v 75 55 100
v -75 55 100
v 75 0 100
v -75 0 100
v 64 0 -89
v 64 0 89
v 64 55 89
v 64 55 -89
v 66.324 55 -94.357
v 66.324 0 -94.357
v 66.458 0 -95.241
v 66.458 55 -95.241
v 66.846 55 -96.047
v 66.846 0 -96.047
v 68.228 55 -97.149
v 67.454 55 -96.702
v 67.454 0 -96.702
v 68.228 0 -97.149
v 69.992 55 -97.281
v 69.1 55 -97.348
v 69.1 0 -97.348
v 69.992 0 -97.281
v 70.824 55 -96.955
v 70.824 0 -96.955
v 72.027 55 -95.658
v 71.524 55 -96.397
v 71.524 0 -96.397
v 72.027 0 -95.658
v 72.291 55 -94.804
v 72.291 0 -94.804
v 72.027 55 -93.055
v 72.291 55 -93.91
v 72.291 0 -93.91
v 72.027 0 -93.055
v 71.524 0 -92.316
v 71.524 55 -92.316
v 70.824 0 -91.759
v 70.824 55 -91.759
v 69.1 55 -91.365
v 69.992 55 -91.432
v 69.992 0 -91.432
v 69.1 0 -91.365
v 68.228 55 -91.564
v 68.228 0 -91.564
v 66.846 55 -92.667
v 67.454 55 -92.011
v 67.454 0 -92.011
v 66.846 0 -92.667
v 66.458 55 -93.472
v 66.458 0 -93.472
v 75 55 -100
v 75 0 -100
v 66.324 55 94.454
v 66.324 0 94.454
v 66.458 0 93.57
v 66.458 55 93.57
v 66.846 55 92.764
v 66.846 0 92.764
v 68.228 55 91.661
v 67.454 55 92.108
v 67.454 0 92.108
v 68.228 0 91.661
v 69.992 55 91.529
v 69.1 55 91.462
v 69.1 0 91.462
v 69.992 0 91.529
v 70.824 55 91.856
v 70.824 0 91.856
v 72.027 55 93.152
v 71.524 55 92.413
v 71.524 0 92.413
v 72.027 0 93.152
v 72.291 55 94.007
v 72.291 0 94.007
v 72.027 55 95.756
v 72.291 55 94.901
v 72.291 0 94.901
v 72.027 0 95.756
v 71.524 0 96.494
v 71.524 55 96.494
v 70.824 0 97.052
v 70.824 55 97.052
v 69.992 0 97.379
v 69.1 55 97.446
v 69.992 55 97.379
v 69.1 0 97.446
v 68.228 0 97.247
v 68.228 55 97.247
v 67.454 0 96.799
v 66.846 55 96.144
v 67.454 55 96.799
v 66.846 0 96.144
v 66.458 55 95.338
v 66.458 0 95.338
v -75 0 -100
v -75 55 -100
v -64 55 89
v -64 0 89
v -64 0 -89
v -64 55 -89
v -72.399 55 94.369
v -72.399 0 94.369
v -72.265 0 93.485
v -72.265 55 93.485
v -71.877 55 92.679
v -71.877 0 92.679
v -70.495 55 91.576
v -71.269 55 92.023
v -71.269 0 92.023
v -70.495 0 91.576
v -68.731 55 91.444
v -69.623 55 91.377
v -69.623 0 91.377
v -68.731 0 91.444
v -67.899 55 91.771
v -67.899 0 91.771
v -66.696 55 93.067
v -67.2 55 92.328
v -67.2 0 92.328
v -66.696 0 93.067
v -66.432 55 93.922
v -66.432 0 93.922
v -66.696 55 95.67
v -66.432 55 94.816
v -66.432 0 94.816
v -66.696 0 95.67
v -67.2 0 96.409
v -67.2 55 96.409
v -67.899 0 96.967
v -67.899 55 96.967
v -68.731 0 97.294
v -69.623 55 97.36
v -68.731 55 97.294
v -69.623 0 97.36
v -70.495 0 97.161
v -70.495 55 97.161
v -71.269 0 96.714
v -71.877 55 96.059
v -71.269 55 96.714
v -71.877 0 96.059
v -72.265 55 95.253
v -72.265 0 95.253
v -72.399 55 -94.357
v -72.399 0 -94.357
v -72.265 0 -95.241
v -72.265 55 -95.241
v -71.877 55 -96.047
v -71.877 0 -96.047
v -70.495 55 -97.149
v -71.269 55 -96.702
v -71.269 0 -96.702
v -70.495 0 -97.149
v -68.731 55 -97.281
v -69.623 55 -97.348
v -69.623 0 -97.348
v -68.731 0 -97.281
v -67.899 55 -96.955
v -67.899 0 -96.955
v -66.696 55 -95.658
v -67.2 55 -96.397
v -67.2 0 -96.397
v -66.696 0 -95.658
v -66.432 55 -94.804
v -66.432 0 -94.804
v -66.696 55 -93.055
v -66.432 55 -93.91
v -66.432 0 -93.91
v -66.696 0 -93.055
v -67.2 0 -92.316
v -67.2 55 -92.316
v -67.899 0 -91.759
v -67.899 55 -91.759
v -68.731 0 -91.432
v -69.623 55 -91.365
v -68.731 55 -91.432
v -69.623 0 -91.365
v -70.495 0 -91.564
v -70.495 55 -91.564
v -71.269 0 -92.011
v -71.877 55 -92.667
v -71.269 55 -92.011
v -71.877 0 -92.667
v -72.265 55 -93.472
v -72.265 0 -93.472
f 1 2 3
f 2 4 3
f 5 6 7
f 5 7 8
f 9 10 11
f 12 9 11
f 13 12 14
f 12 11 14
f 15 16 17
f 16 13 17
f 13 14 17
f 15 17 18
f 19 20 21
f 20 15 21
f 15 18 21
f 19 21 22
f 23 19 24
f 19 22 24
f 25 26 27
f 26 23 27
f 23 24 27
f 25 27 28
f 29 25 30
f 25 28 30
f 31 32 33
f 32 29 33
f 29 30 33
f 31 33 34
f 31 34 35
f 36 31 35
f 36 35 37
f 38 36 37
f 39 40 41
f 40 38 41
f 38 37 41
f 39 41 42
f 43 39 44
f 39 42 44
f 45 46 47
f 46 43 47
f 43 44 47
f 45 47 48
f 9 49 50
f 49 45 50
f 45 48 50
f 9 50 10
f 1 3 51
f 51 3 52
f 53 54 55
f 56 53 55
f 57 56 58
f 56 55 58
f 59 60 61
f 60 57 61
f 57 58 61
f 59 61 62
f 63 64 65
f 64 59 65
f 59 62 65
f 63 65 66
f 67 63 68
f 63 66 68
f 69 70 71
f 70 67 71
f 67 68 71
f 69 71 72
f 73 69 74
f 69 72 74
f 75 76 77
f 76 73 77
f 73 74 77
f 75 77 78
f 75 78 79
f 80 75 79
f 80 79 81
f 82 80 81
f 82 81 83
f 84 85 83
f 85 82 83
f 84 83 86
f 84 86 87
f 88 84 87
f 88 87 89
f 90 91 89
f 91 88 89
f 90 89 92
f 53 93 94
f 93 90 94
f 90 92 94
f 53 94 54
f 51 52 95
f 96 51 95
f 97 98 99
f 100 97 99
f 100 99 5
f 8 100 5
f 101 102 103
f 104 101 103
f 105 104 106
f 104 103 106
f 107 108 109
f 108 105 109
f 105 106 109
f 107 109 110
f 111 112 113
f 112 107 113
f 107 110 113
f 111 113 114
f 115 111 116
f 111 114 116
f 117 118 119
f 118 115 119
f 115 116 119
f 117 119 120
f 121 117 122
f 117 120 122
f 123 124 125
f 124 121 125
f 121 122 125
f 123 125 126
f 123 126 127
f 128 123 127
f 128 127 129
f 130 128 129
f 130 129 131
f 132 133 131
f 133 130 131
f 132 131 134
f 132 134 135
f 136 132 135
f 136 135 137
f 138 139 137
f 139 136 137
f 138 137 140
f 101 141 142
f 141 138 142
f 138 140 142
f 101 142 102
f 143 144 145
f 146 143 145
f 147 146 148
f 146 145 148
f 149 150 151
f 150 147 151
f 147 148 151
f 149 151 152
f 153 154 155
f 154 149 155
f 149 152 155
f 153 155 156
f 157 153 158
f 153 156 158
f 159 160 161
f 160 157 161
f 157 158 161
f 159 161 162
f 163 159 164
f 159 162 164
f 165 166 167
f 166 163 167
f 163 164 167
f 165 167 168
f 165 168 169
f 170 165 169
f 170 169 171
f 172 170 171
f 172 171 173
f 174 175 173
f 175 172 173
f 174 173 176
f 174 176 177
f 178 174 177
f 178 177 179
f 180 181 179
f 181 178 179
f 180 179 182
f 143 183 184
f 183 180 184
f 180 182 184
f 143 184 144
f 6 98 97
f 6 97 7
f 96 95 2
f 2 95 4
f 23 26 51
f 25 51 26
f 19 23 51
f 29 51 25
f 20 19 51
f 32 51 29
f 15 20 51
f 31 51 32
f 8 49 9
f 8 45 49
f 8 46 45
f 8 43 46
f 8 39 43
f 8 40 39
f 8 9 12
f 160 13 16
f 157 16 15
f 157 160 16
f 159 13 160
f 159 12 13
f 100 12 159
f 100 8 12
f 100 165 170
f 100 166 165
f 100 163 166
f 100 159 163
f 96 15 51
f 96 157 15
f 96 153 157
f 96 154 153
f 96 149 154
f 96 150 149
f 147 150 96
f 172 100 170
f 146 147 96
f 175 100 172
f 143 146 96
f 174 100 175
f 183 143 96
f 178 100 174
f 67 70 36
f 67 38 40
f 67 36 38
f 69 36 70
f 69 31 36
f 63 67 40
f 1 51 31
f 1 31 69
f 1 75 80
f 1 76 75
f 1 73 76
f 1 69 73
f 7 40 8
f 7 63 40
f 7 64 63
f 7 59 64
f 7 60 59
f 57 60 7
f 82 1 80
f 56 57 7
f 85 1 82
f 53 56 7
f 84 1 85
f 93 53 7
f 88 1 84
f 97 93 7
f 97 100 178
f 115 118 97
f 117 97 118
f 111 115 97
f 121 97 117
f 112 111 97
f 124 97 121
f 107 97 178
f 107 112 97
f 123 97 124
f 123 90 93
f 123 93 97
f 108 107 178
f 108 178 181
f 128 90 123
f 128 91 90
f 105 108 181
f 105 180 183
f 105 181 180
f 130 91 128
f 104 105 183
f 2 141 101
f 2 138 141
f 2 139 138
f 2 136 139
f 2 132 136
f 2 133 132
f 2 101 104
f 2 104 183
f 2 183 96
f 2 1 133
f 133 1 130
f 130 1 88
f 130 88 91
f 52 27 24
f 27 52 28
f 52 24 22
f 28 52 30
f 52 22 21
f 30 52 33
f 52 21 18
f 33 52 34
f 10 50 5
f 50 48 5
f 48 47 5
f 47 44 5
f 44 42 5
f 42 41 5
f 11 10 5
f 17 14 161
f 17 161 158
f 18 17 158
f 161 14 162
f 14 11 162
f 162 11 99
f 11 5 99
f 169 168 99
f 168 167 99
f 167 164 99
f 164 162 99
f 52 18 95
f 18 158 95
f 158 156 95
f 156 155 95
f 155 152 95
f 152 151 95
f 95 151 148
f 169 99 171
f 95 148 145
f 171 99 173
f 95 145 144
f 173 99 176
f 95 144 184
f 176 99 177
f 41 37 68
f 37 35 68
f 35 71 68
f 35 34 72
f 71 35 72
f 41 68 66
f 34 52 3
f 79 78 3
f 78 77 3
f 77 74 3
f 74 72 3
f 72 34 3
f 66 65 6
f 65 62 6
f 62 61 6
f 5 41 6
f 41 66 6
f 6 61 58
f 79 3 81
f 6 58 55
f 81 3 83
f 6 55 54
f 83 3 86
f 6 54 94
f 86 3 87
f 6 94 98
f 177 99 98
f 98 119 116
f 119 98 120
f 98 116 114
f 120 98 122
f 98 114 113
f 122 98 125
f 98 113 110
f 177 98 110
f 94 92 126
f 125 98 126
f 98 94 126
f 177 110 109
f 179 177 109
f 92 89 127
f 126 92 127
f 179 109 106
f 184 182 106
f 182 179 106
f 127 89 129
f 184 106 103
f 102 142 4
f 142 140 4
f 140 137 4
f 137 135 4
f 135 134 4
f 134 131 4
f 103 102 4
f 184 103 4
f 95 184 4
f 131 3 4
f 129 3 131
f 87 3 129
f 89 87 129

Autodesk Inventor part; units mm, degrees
ref_plane "YZ Plane" through (0, 0, 0) normal (1, 0, 0) x (0, 1, 0)
ref_plane "XZ Plane" through (0, 0, 0) normal (0, 1, 0) x (-1, 0, 0)
ref_plane "XY Plane" through (0, 0, 0) normal (0, 0, 1) x (1, 0, 0)
sketch "Sketch1" plane through (0, 0, 0) normal (0, 1, 0) x (-1, 0, 0)
  line L0 (-75, 0) -> (-75, -100)
  line L1 (-75, -100) -> (75, -100)
  line L2 (75, -100) -> (75, 100)
  line L3 (75, 100) -> (-75, 100)
  line L4 (-75, 100) -> (-75, 0)
  circle A0 centre (69.3987, -94.3567) radius 3
  circle A1 centre (-69.3245, -94.3567) radius 3
  circle A2 centre (69.3987, 94.3688) radius 3
  circle A3 centre (-69.3245, 94.4539) radius 3
  line L5 (75, -100) -> (75, -97.4)
  line L6 (75, 100) -> (57, 100)
  line L7 (75, 100) -> (64, 100)
  line L8 (64, 100) -> (64, -100)
  line L9 (-75, 100) -> (-64, 100)
  line L10 (-64, 100) -> (-64, -100)
  line L11 (64, -100) -> (64, -89)
  line L12 (64, -89) -> (-64, -89)
  line L13 (64, 100) -> (64, 89)
  line L14 (64, 89) -> (-64, 89)
  point P0 (0, 0)
  dimension "d3" = 200
  dimension "d4" = 150
  dimension "d5" = 6
  dimension "d6" = 6
  dimension "d7" = 6
  dimension "d8" = 6
  dimension "d18" = 11
extrude "Extrusion1" add sketch "Sketch1" along normal blind 55 contours L3 L8 L14 L10
extrude "Extrusion2" add sketch "Sketch1" along normal blind 55 contours L8 L3 L2 L1
extrude "Extrusion3" add sketch "Sketch1" along normal blind 55 contours L4 L3 L10 L1 L0
extrude "Extrusion4" add sketch "Sketch1" along normal blind 55 contours L10 L12 L8 L1
